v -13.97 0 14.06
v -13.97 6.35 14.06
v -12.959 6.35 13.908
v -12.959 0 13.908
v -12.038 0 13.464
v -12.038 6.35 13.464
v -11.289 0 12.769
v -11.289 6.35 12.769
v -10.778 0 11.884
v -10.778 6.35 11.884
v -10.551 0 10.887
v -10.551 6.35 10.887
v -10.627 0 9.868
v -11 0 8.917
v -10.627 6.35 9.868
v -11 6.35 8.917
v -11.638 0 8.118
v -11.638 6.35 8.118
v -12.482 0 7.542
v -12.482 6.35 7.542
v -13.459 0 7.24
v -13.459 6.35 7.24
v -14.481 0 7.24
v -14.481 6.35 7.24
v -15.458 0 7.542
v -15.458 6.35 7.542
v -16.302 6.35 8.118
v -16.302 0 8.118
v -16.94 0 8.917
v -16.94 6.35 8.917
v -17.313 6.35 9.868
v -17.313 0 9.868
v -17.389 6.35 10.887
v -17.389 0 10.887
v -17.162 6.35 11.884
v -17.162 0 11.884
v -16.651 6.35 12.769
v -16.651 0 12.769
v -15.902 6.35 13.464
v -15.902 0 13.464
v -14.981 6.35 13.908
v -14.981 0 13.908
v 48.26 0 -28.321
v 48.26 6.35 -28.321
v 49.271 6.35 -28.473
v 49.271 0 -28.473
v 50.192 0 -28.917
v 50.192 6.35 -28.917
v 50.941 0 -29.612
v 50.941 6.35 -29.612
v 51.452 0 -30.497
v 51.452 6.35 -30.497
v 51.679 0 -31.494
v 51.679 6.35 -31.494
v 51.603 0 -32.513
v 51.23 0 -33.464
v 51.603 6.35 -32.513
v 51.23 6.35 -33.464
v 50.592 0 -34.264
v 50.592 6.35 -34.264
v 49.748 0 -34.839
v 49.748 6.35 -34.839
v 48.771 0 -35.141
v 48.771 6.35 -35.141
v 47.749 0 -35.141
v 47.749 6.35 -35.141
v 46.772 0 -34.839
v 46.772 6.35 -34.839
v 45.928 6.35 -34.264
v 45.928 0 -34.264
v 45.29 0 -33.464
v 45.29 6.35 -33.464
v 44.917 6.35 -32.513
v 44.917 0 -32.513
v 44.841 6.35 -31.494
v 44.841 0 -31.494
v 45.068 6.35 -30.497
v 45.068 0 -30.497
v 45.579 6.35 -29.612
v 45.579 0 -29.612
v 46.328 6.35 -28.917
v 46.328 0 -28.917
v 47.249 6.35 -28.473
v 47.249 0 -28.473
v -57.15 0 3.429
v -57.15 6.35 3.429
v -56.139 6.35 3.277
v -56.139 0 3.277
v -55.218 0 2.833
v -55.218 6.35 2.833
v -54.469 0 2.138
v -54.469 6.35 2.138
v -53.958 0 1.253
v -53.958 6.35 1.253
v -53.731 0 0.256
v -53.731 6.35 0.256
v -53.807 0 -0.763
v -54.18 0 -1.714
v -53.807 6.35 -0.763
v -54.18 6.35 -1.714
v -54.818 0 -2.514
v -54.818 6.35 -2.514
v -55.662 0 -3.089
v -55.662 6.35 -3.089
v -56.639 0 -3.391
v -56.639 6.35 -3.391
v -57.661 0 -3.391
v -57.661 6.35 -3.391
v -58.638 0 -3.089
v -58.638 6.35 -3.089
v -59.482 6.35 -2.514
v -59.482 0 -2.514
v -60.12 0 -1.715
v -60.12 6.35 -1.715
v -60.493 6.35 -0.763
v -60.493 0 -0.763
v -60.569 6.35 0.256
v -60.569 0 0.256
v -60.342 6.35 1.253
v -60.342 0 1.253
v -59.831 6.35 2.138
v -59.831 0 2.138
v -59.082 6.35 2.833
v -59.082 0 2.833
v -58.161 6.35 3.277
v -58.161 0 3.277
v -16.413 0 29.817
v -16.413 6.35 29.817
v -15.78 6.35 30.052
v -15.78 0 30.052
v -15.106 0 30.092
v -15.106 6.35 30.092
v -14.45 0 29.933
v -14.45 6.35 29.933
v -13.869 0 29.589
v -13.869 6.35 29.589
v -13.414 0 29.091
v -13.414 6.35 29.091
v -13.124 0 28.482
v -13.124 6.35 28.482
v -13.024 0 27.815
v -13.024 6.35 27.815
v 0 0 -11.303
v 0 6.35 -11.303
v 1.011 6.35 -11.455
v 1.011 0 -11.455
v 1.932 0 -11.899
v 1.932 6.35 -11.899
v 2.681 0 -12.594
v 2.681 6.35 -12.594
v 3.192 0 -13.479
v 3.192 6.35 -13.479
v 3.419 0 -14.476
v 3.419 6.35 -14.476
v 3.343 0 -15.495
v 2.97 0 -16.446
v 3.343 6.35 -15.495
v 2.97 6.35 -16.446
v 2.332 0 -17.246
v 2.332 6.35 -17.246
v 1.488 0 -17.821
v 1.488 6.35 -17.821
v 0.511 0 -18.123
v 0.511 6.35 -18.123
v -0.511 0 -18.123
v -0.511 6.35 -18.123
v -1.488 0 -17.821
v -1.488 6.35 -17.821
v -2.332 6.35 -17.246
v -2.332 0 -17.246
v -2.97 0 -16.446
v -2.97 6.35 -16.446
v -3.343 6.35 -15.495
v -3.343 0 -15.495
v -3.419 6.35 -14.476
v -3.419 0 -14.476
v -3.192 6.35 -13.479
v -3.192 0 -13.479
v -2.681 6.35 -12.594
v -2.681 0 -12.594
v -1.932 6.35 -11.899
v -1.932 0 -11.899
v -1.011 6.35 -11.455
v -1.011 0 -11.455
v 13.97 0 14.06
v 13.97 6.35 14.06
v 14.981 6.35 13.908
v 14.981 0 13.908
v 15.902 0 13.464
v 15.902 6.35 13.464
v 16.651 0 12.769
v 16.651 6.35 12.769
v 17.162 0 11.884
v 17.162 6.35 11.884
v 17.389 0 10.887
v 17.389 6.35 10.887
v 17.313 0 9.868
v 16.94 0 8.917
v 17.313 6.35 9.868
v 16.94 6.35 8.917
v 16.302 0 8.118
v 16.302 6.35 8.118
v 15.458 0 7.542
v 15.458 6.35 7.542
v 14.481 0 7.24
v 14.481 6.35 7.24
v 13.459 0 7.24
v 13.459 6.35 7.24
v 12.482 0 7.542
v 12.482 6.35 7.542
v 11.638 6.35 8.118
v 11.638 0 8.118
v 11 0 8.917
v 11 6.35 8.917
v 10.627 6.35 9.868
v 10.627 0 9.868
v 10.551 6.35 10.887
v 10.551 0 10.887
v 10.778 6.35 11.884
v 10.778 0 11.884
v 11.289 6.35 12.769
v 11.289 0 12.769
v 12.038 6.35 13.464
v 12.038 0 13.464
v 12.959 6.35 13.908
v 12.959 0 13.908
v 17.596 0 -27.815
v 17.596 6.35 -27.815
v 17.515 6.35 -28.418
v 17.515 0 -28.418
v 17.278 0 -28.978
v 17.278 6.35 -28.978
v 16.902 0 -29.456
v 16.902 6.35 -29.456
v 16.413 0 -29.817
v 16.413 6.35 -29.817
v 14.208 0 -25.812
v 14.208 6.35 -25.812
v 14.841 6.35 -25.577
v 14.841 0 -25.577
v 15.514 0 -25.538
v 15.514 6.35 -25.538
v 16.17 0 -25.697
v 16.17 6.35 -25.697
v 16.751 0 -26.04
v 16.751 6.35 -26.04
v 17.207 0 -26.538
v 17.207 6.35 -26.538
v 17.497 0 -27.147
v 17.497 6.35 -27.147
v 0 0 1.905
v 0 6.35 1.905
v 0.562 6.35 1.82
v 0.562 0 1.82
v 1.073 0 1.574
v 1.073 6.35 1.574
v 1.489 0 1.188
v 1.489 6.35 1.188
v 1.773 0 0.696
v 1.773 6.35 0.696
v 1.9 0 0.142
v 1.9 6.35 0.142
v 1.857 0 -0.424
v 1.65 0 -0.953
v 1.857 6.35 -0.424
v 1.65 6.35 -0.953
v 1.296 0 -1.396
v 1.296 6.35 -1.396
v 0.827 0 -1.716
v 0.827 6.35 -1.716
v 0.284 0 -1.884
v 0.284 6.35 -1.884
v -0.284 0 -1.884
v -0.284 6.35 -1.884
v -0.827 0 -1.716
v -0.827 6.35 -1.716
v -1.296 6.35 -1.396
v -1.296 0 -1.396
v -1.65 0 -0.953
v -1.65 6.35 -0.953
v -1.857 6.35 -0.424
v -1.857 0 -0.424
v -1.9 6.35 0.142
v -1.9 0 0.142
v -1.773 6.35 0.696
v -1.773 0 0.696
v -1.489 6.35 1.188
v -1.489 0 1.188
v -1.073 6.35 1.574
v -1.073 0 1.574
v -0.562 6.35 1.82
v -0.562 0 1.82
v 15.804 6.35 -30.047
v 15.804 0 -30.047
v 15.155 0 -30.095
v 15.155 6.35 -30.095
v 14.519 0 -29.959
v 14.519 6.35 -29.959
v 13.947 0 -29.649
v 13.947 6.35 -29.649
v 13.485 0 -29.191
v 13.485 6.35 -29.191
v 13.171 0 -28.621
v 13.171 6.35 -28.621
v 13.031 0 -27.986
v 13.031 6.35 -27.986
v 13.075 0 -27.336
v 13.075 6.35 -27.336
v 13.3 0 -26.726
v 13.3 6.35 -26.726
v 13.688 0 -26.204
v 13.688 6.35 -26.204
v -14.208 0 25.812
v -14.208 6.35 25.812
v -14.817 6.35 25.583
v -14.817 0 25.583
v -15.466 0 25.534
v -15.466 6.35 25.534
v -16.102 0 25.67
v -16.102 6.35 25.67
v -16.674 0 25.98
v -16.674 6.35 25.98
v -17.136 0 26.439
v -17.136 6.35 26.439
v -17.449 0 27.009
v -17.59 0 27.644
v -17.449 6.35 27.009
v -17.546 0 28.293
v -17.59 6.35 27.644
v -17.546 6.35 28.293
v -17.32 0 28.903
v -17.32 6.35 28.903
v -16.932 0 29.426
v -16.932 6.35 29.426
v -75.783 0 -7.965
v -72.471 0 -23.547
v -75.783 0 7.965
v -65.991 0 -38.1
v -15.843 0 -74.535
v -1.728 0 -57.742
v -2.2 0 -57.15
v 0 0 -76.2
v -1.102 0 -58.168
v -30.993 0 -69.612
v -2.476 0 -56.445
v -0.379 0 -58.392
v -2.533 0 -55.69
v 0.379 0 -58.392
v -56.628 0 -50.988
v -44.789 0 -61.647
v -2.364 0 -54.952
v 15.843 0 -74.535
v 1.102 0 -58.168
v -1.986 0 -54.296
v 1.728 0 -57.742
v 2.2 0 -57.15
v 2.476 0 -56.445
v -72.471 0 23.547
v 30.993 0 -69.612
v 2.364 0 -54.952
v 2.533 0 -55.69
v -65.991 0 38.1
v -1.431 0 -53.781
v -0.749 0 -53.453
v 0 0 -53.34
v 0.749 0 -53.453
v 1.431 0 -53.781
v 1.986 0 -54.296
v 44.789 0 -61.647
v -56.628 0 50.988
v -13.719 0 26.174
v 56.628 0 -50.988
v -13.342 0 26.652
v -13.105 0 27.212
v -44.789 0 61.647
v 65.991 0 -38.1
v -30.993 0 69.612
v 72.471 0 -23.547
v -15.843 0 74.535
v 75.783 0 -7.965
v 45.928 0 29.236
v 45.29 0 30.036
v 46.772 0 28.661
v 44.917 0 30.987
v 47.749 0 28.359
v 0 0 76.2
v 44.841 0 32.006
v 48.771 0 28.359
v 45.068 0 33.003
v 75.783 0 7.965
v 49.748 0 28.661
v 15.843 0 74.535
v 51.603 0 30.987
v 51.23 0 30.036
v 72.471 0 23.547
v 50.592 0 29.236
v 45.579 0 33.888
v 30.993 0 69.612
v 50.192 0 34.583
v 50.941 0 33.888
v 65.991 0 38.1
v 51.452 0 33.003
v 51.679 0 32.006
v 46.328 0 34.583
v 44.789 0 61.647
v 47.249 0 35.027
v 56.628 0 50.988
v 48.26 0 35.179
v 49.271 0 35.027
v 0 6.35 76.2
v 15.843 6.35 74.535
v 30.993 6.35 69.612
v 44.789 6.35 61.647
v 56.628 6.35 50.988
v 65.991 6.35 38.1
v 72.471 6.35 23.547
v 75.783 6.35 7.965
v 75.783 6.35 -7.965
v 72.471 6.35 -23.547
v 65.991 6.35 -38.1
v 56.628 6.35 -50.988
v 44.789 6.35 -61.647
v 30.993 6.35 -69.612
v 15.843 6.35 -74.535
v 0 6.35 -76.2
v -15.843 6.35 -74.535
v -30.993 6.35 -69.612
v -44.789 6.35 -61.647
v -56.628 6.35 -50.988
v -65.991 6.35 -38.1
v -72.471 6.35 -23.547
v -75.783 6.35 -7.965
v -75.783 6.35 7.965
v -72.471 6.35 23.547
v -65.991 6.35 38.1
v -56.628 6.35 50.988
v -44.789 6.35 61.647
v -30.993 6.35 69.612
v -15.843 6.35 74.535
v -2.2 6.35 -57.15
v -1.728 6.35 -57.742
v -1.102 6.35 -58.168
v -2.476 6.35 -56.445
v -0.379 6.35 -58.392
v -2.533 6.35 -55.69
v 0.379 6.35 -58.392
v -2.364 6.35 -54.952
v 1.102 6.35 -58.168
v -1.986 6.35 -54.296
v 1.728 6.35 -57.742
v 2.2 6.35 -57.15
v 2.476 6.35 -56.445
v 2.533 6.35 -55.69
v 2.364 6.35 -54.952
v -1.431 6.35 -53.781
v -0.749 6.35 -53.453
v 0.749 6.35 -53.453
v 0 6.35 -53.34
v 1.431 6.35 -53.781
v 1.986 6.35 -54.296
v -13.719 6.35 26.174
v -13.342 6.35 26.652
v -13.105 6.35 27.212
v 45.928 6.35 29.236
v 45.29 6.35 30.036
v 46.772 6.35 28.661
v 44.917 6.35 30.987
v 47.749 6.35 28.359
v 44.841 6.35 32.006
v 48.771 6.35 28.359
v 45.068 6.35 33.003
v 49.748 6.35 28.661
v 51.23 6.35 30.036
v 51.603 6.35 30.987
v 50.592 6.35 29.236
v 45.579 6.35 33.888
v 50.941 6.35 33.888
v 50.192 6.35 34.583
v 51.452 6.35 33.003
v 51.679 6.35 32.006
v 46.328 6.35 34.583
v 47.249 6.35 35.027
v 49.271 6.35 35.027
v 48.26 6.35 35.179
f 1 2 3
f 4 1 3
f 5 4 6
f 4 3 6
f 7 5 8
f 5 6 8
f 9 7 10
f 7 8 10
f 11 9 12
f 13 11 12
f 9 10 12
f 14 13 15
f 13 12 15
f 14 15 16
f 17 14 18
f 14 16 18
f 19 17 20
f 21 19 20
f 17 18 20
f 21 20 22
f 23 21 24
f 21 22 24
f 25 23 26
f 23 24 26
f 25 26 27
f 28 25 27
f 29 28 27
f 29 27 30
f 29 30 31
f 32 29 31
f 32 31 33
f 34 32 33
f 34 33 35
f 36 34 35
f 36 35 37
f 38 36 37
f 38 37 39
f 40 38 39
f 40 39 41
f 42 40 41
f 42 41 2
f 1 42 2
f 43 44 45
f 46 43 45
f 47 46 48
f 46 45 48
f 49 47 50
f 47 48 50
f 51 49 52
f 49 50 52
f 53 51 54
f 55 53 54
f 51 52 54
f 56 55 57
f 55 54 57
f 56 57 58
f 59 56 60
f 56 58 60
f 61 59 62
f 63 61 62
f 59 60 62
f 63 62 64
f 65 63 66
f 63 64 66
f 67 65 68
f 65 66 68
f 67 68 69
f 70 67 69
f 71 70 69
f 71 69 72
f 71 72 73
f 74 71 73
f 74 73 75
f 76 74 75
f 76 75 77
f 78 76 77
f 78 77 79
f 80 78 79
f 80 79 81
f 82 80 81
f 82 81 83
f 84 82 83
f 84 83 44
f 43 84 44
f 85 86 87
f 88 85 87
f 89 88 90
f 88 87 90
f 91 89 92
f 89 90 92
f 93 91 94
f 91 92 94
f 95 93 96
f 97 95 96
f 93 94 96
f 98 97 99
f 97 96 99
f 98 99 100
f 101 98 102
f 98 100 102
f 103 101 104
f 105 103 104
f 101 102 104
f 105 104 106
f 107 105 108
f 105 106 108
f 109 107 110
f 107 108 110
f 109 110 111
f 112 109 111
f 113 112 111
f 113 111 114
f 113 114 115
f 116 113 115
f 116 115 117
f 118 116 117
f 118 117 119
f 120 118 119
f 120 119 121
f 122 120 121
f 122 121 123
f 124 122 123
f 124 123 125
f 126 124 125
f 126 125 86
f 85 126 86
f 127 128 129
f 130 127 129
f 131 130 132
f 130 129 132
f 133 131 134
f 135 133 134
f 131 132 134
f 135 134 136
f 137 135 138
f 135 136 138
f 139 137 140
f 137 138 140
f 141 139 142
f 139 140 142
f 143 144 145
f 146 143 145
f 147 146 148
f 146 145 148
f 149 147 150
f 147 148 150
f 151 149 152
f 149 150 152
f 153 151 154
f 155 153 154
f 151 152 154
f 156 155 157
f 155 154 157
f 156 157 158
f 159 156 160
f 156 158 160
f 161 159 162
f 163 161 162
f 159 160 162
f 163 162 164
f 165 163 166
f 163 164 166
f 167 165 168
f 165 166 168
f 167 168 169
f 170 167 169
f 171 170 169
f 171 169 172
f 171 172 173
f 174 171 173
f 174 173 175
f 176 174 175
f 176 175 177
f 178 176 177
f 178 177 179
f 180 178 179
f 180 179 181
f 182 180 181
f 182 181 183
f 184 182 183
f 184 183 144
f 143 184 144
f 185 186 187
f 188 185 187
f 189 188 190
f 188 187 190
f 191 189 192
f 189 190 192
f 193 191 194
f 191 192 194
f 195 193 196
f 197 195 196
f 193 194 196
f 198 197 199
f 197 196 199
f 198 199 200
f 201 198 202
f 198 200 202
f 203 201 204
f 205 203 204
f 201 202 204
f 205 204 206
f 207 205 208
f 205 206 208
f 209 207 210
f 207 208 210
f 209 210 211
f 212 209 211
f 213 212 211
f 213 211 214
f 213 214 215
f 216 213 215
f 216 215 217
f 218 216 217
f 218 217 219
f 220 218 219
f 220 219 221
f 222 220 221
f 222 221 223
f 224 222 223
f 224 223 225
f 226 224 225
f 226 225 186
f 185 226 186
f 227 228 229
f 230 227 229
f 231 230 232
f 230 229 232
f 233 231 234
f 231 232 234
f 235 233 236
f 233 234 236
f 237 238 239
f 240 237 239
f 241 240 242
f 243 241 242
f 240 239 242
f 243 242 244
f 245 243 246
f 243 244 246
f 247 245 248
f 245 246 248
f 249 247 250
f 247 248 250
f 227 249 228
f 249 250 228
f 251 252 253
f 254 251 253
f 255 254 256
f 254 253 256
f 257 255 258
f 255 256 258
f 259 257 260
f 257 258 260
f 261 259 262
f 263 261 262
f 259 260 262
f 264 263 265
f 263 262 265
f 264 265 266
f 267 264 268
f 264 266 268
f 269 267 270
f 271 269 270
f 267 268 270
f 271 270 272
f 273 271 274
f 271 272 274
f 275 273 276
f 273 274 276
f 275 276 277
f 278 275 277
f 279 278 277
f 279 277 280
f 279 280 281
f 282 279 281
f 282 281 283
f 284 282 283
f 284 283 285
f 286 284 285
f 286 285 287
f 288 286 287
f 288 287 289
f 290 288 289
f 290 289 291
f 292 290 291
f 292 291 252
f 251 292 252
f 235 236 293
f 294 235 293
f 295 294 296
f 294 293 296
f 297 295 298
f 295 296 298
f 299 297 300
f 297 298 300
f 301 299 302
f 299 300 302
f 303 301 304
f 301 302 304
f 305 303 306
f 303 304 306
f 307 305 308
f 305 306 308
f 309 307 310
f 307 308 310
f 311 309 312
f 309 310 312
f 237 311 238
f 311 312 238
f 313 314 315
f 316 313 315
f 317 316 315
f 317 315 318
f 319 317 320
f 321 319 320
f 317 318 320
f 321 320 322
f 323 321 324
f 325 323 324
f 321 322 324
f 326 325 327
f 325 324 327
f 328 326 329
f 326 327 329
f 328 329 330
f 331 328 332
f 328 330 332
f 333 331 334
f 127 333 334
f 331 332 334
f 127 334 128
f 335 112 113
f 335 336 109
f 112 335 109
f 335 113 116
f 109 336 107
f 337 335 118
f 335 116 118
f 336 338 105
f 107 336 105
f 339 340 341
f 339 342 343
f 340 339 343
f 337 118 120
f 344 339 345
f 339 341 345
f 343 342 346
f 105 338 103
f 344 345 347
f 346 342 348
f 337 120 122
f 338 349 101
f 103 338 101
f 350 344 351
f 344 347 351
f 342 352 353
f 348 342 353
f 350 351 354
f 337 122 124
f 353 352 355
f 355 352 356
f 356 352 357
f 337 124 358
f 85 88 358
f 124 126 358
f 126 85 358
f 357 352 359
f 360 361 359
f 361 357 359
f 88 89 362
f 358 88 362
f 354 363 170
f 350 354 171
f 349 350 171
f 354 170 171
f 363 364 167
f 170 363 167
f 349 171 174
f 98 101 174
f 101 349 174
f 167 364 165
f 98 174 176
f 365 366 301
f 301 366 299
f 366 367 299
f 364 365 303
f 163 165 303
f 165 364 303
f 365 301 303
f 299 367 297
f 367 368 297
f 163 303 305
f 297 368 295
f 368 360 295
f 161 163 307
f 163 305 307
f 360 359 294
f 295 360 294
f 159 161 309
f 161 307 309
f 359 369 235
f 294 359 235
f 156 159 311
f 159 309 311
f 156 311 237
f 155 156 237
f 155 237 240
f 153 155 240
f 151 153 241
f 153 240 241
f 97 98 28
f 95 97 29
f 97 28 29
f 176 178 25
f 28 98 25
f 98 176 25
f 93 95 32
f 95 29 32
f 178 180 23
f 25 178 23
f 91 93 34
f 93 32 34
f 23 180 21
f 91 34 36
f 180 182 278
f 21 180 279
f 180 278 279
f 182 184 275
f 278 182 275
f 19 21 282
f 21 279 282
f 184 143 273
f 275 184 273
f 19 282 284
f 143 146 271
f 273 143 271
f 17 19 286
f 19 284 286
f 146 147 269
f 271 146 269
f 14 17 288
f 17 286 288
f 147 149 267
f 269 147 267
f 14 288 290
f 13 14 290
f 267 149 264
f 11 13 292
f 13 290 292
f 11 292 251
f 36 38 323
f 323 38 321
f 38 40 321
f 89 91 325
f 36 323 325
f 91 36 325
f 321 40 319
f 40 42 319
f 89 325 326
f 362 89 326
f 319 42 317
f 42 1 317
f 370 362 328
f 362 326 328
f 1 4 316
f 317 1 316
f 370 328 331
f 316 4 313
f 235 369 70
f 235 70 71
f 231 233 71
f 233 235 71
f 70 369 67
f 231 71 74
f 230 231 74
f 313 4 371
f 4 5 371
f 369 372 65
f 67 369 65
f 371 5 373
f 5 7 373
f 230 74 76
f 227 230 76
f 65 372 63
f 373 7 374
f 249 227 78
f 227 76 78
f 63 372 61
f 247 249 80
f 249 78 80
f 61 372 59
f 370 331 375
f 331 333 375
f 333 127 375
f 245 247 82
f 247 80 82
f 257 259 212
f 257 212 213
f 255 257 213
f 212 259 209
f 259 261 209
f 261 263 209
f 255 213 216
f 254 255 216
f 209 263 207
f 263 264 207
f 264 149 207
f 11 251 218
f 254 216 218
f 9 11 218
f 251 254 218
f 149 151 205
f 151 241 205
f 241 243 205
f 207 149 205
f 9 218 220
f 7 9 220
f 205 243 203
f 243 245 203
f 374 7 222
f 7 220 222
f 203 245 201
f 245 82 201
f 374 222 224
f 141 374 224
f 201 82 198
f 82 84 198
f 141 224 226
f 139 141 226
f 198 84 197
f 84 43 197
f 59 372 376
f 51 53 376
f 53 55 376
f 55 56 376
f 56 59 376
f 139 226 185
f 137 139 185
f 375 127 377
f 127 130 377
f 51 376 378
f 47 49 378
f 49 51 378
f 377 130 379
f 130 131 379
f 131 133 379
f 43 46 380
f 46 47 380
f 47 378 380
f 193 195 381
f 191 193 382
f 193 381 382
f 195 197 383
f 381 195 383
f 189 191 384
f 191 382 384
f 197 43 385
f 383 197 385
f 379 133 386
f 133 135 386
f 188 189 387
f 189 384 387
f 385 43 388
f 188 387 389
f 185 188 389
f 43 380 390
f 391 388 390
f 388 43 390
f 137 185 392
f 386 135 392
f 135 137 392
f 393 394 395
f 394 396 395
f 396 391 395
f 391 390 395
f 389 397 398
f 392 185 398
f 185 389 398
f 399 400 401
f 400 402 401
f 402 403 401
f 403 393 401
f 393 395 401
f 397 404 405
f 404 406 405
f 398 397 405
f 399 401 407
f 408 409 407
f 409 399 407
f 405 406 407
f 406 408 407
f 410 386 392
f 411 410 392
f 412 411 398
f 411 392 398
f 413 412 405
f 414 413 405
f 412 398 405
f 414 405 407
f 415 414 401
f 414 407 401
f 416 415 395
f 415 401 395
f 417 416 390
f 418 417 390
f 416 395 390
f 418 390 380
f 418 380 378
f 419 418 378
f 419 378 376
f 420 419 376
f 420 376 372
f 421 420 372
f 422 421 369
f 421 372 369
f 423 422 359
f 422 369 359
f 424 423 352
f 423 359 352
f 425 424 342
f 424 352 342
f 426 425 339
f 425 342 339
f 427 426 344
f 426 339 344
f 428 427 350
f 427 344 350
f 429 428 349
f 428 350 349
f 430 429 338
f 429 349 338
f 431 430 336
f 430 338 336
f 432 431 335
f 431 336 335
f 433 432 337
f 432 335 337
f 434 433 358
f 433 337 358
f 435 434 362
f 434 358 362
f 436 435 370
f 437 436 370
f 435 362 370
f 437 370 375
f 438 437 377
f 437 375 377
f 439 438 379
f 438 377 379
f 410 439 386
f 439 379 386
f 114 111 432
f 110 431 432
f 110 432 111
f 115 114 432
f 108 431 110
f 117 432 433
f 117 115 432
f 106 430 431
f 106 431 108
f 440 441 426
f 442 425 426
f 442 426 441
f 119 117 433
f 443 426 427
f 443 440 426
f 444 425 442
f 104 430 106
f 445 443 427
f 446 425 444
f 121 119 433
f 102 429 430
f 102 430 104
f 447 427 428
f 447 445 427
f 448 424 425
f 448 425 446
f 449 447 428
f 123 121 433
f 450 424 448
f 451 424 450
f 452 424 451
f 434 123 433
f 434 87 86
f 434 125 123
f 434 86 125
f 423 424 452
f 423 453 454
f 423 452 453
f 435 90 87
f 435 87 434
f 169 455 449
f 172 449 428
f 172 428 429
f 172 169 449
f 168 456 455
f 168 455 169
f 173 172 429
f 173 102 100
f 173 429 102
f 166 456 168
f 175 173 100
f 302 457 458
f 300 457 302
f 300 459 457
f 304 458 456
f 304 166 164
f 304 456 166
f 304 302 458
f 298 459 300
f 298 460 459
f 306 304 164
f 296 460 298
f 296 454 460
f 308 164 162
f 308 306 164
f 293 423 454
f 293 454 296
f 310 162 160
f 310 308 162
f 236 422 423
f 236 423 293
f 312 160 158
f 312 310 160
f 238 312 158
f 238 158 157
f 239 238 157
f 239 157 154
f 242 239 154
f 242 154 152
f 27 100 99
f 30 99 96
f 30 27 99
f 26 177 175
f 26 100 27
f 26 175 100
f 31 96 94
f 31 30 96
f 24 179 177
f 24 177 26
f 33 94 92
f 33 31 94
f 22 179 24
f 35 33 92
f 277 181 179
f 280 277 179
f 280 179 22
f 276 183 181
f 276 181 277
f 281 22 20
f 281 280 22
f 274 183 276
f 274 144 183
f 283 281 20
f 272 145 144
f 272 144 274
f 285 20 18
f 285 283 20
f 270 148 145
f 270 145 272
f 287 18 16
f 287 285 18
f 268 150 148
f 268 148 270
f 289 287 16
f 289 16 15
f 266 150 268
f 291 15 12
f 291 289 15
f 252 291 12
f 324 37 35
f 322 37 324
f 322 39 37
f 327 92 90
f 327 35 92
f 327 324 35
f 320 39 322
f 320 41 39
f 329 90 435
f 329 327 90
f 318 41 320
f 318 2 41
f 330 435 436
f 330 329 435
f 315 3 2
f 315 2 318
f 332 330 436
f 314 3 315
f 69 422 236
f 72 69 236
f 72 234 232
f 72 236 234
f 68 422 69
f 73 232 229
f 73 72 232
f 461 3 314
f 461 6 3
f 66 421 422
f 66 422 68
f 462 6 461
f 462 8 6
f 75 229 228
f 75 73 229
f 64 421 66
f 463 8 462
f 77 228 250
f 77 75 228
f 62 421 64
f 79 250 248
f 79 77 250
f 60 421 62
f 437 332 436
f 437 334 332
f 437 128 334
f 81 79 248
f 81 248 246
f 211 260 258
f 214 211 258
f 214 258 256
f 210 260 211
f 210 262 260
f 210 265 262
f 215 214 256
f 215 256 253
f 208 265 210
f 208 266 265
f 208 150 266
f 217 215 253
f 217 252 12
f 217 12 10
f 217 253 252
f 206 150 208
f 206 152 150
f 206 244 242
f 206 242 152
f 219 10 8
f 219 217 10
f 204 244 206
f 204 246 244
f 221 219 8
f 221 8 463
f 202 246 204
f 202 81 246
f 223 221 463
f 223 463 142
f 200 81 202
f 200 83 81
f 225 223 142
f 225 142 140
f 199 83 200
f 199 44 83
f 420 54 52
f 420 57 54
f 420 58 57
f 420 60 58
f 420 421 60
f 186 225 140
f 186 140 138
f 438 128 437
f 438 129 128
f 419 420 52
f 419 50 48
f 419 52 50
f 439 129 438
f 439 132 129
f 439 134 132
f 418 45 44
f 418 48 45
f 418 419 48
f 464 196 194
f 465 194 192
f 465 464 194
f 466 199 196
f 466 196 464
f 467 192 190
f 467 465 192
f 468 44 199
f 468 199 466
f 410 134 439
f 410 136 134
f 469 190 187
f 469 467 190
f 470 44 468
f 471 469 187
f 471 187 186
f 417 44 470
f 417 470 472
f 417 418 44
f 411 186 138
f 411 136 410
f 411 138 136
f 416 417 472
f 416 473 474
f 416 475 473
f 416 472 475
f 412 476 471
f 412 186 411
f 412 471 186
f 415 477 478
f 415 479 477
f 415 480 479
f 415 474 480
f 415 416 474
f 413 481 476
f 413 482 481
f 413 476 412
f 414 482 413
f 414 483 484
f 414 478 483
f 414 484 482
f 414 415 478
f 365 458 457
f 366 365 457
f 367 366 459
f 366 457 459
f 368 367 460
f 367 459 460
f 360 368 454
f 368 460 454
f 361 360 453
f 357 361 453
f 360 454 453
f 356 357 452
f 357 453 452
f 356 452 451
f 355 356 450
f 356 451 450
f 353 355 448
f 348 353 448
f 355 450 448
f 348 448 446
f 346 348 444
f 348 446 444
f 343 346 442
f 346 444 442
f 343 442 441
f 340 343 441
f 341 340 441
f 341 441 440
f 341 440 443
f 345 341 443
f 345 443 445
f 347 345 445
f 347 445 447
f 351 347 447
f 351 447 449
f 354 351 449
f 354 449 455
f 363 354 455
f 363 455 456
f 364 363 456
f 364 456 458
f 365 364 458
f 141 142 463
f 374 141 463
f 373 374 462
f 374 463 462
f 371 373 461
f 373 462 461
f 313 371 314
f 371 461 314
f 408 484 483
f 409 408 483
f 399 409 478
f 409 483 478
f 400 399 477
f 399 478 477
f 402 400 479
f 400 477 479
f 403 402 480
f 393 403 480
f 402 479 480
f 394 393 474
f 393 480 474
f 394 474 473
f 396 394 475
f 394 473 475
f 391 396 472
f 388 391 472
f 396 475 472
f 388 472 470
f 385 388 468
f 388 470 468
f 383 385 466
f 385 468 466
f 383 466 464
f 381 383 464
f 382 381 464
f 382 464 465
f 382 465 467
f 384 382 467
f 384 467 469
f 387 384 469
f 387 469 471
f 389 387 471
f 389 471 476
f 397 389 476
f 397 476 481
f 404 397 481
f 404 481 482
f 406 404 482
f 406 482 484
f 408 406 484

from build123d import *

# Parameters (mm, degrees)
SKETCH1_R           = 76.2
BOSS_EXTRUDE1_DEPTH = 6.35
SKETCH2_R           = 1.905
CUT_EXTRUDE1_DEPTH  = 108.95
SKETCH3_R           = 3.429
CUT_EXTRUDE2_DEPTH  = 108.95
SKETCH4_R           = 3.429
CUT_EXTRUDE3_DEPTH  = 108.95
SKETCH5_R           = 2.54
CUT_EXTRUDE4_DEPTH  = 108.95
CUT_EXTRUDE5_DEPTH  = 108.95


with BuildPart() as part:
    # Sketch1 → Boss-Extrude1 (new body)
    with BuildSketch(Plane(origin=(0, 0, 0), x_dir=(1, 0, 0), z_dir=(0, 1, 0))):
        with Locations(Location((0, 0, 0), (0, 0, 270))):
            Circle(SKETCH1_R)
    extrude(amount=BOSS_EXTRUDE1_DEPTH)

    # Sketch2 → Cut-Extrude1 (cut, through all)
    with BuildSketch(Plane(origin=(0, 6.35, 0), x_dir=(1, 0, 0), z_dir=(0, 1, 0))):
        with Locations(Location((0, 0, 0), (0, 0, 270))):
            Circle(SKETCH2_R)
    extrude(amount=-CUT_EXTRUDE1_DEPTH, mode=Mode.SUBTRACT)

    # Sketch3 → Cut-Extrude2 (cut, through all)
    with BuildSketch(Plane(origin=(0, 6.35, 0), x_dir=(1, 0, 0), z_dir=(0, 1, 0))):
        with Locations(Location((0, 14.732, 0), (0, 0, 270))):
            Circle(SKETCH3_R)
        with Locations(Location((-13.97, -10.631143259, 0), (0, 0, 270))):
            Circle(SKETCH3_R)
        with Locations(Location((13.97, -10.631143259, 0), (0, 0, 270))):
            Circle(SKETCH3_R)
    extrude(amount=-CUT_EXTRUDE2_DEPTH, mode=Mode.SUBTRACT)

    # Sketch4 → Cut-Extrude3 (cut, through all)
    with BuildSketch(Plane(origin=(0, 6.35, 0), x_dir=(1, 0, 0), z_dir=(0, 1, 0))):
        with Locations(Location((-57.15, 0, 0), (0, 0, 270))):
            Circle(SKETCH4_R)
        with Locations(Location((48.26, 31.75, 0), (0, 0, 270))):
            Circle(SKETCH4_R)
        with Locations(Location((48.26, -31.75, 0), (0, 0, 270))):
            Circle(SKETCH4_R)
    extrude(amount=-CUT_EXTRUDE3_DEPTH, mode=Mode.SUBTRACT)

    # Sketch5 → Cut-Extrude4 (cut, through all)
    with BuildSketch(Plane(origin=(0, 6.35, 0), x_dir=(1, 0, 0), z_dir=(0, 1, 0))):
        with Locations(Location((0, 55.88, 0), (0, 0, 270))):
            Circle(SKETCH5_R)
    extrude(amount=-CUT_EXTRUDE4_DEPTH, mode=Mode.SUBTRACT)

    # Sketch6 → Cut-Extrude5 (cut, through all)
    with BuildSketch(Plane(origin=(0, 6.35, 0), x_dir=(1, 0, 0), z_dir=(0, 1, 0))):
        with BuildLine():
            ThreePointArc((-13.024260998, -27.814715677), (-13.342299809, -26.651562737), (-14.207922206, -25.812056148))
            Line((-14.207922206, -25.812056148), (-16.412599789, -29.817375206))
            ThreePointArc((-16.412599789, -29.817375206), (-14.147108058, -29.782676865), (-13.024260998, -27.814715677))
        make_face()
        with BuildLine():
            Line((-16.412599789, -29.817375206), (-14.207922206, -25.812056148))
            ThreePointArc((-14.207922206, -25.812056148), (-17.312920526, -26.712376885), (-16.412599789, -29.817375206))
        make_face()
        with BuildLine():
            ThreePointArc((17.596260998, 27.814715677), (17.278222186, 28.977868616), (16.412599789, 29.817375206))
            Line((16.412599789, 29.817375206), (14.207922206, 25.812056148))
            ThreePointArc((14.207922206, 25.812056148), (16.473413937, 25.846754488), (17.596260998, 27.814715677))
        make_face()
        with BuildLine():
            Line((14.207922206, 25.812056148), (16.412599789, 29.817375206))
            ThreePointArc((16.412599789, 29.817375206), (13.307601469, 28.917054469), (14.207922206, 25.812056148))
        make_face()
    extrude(amount=-CUT_EXTRUDE5_DEPTH, mode=Mode.SUBTRACT)


solid = part.part
